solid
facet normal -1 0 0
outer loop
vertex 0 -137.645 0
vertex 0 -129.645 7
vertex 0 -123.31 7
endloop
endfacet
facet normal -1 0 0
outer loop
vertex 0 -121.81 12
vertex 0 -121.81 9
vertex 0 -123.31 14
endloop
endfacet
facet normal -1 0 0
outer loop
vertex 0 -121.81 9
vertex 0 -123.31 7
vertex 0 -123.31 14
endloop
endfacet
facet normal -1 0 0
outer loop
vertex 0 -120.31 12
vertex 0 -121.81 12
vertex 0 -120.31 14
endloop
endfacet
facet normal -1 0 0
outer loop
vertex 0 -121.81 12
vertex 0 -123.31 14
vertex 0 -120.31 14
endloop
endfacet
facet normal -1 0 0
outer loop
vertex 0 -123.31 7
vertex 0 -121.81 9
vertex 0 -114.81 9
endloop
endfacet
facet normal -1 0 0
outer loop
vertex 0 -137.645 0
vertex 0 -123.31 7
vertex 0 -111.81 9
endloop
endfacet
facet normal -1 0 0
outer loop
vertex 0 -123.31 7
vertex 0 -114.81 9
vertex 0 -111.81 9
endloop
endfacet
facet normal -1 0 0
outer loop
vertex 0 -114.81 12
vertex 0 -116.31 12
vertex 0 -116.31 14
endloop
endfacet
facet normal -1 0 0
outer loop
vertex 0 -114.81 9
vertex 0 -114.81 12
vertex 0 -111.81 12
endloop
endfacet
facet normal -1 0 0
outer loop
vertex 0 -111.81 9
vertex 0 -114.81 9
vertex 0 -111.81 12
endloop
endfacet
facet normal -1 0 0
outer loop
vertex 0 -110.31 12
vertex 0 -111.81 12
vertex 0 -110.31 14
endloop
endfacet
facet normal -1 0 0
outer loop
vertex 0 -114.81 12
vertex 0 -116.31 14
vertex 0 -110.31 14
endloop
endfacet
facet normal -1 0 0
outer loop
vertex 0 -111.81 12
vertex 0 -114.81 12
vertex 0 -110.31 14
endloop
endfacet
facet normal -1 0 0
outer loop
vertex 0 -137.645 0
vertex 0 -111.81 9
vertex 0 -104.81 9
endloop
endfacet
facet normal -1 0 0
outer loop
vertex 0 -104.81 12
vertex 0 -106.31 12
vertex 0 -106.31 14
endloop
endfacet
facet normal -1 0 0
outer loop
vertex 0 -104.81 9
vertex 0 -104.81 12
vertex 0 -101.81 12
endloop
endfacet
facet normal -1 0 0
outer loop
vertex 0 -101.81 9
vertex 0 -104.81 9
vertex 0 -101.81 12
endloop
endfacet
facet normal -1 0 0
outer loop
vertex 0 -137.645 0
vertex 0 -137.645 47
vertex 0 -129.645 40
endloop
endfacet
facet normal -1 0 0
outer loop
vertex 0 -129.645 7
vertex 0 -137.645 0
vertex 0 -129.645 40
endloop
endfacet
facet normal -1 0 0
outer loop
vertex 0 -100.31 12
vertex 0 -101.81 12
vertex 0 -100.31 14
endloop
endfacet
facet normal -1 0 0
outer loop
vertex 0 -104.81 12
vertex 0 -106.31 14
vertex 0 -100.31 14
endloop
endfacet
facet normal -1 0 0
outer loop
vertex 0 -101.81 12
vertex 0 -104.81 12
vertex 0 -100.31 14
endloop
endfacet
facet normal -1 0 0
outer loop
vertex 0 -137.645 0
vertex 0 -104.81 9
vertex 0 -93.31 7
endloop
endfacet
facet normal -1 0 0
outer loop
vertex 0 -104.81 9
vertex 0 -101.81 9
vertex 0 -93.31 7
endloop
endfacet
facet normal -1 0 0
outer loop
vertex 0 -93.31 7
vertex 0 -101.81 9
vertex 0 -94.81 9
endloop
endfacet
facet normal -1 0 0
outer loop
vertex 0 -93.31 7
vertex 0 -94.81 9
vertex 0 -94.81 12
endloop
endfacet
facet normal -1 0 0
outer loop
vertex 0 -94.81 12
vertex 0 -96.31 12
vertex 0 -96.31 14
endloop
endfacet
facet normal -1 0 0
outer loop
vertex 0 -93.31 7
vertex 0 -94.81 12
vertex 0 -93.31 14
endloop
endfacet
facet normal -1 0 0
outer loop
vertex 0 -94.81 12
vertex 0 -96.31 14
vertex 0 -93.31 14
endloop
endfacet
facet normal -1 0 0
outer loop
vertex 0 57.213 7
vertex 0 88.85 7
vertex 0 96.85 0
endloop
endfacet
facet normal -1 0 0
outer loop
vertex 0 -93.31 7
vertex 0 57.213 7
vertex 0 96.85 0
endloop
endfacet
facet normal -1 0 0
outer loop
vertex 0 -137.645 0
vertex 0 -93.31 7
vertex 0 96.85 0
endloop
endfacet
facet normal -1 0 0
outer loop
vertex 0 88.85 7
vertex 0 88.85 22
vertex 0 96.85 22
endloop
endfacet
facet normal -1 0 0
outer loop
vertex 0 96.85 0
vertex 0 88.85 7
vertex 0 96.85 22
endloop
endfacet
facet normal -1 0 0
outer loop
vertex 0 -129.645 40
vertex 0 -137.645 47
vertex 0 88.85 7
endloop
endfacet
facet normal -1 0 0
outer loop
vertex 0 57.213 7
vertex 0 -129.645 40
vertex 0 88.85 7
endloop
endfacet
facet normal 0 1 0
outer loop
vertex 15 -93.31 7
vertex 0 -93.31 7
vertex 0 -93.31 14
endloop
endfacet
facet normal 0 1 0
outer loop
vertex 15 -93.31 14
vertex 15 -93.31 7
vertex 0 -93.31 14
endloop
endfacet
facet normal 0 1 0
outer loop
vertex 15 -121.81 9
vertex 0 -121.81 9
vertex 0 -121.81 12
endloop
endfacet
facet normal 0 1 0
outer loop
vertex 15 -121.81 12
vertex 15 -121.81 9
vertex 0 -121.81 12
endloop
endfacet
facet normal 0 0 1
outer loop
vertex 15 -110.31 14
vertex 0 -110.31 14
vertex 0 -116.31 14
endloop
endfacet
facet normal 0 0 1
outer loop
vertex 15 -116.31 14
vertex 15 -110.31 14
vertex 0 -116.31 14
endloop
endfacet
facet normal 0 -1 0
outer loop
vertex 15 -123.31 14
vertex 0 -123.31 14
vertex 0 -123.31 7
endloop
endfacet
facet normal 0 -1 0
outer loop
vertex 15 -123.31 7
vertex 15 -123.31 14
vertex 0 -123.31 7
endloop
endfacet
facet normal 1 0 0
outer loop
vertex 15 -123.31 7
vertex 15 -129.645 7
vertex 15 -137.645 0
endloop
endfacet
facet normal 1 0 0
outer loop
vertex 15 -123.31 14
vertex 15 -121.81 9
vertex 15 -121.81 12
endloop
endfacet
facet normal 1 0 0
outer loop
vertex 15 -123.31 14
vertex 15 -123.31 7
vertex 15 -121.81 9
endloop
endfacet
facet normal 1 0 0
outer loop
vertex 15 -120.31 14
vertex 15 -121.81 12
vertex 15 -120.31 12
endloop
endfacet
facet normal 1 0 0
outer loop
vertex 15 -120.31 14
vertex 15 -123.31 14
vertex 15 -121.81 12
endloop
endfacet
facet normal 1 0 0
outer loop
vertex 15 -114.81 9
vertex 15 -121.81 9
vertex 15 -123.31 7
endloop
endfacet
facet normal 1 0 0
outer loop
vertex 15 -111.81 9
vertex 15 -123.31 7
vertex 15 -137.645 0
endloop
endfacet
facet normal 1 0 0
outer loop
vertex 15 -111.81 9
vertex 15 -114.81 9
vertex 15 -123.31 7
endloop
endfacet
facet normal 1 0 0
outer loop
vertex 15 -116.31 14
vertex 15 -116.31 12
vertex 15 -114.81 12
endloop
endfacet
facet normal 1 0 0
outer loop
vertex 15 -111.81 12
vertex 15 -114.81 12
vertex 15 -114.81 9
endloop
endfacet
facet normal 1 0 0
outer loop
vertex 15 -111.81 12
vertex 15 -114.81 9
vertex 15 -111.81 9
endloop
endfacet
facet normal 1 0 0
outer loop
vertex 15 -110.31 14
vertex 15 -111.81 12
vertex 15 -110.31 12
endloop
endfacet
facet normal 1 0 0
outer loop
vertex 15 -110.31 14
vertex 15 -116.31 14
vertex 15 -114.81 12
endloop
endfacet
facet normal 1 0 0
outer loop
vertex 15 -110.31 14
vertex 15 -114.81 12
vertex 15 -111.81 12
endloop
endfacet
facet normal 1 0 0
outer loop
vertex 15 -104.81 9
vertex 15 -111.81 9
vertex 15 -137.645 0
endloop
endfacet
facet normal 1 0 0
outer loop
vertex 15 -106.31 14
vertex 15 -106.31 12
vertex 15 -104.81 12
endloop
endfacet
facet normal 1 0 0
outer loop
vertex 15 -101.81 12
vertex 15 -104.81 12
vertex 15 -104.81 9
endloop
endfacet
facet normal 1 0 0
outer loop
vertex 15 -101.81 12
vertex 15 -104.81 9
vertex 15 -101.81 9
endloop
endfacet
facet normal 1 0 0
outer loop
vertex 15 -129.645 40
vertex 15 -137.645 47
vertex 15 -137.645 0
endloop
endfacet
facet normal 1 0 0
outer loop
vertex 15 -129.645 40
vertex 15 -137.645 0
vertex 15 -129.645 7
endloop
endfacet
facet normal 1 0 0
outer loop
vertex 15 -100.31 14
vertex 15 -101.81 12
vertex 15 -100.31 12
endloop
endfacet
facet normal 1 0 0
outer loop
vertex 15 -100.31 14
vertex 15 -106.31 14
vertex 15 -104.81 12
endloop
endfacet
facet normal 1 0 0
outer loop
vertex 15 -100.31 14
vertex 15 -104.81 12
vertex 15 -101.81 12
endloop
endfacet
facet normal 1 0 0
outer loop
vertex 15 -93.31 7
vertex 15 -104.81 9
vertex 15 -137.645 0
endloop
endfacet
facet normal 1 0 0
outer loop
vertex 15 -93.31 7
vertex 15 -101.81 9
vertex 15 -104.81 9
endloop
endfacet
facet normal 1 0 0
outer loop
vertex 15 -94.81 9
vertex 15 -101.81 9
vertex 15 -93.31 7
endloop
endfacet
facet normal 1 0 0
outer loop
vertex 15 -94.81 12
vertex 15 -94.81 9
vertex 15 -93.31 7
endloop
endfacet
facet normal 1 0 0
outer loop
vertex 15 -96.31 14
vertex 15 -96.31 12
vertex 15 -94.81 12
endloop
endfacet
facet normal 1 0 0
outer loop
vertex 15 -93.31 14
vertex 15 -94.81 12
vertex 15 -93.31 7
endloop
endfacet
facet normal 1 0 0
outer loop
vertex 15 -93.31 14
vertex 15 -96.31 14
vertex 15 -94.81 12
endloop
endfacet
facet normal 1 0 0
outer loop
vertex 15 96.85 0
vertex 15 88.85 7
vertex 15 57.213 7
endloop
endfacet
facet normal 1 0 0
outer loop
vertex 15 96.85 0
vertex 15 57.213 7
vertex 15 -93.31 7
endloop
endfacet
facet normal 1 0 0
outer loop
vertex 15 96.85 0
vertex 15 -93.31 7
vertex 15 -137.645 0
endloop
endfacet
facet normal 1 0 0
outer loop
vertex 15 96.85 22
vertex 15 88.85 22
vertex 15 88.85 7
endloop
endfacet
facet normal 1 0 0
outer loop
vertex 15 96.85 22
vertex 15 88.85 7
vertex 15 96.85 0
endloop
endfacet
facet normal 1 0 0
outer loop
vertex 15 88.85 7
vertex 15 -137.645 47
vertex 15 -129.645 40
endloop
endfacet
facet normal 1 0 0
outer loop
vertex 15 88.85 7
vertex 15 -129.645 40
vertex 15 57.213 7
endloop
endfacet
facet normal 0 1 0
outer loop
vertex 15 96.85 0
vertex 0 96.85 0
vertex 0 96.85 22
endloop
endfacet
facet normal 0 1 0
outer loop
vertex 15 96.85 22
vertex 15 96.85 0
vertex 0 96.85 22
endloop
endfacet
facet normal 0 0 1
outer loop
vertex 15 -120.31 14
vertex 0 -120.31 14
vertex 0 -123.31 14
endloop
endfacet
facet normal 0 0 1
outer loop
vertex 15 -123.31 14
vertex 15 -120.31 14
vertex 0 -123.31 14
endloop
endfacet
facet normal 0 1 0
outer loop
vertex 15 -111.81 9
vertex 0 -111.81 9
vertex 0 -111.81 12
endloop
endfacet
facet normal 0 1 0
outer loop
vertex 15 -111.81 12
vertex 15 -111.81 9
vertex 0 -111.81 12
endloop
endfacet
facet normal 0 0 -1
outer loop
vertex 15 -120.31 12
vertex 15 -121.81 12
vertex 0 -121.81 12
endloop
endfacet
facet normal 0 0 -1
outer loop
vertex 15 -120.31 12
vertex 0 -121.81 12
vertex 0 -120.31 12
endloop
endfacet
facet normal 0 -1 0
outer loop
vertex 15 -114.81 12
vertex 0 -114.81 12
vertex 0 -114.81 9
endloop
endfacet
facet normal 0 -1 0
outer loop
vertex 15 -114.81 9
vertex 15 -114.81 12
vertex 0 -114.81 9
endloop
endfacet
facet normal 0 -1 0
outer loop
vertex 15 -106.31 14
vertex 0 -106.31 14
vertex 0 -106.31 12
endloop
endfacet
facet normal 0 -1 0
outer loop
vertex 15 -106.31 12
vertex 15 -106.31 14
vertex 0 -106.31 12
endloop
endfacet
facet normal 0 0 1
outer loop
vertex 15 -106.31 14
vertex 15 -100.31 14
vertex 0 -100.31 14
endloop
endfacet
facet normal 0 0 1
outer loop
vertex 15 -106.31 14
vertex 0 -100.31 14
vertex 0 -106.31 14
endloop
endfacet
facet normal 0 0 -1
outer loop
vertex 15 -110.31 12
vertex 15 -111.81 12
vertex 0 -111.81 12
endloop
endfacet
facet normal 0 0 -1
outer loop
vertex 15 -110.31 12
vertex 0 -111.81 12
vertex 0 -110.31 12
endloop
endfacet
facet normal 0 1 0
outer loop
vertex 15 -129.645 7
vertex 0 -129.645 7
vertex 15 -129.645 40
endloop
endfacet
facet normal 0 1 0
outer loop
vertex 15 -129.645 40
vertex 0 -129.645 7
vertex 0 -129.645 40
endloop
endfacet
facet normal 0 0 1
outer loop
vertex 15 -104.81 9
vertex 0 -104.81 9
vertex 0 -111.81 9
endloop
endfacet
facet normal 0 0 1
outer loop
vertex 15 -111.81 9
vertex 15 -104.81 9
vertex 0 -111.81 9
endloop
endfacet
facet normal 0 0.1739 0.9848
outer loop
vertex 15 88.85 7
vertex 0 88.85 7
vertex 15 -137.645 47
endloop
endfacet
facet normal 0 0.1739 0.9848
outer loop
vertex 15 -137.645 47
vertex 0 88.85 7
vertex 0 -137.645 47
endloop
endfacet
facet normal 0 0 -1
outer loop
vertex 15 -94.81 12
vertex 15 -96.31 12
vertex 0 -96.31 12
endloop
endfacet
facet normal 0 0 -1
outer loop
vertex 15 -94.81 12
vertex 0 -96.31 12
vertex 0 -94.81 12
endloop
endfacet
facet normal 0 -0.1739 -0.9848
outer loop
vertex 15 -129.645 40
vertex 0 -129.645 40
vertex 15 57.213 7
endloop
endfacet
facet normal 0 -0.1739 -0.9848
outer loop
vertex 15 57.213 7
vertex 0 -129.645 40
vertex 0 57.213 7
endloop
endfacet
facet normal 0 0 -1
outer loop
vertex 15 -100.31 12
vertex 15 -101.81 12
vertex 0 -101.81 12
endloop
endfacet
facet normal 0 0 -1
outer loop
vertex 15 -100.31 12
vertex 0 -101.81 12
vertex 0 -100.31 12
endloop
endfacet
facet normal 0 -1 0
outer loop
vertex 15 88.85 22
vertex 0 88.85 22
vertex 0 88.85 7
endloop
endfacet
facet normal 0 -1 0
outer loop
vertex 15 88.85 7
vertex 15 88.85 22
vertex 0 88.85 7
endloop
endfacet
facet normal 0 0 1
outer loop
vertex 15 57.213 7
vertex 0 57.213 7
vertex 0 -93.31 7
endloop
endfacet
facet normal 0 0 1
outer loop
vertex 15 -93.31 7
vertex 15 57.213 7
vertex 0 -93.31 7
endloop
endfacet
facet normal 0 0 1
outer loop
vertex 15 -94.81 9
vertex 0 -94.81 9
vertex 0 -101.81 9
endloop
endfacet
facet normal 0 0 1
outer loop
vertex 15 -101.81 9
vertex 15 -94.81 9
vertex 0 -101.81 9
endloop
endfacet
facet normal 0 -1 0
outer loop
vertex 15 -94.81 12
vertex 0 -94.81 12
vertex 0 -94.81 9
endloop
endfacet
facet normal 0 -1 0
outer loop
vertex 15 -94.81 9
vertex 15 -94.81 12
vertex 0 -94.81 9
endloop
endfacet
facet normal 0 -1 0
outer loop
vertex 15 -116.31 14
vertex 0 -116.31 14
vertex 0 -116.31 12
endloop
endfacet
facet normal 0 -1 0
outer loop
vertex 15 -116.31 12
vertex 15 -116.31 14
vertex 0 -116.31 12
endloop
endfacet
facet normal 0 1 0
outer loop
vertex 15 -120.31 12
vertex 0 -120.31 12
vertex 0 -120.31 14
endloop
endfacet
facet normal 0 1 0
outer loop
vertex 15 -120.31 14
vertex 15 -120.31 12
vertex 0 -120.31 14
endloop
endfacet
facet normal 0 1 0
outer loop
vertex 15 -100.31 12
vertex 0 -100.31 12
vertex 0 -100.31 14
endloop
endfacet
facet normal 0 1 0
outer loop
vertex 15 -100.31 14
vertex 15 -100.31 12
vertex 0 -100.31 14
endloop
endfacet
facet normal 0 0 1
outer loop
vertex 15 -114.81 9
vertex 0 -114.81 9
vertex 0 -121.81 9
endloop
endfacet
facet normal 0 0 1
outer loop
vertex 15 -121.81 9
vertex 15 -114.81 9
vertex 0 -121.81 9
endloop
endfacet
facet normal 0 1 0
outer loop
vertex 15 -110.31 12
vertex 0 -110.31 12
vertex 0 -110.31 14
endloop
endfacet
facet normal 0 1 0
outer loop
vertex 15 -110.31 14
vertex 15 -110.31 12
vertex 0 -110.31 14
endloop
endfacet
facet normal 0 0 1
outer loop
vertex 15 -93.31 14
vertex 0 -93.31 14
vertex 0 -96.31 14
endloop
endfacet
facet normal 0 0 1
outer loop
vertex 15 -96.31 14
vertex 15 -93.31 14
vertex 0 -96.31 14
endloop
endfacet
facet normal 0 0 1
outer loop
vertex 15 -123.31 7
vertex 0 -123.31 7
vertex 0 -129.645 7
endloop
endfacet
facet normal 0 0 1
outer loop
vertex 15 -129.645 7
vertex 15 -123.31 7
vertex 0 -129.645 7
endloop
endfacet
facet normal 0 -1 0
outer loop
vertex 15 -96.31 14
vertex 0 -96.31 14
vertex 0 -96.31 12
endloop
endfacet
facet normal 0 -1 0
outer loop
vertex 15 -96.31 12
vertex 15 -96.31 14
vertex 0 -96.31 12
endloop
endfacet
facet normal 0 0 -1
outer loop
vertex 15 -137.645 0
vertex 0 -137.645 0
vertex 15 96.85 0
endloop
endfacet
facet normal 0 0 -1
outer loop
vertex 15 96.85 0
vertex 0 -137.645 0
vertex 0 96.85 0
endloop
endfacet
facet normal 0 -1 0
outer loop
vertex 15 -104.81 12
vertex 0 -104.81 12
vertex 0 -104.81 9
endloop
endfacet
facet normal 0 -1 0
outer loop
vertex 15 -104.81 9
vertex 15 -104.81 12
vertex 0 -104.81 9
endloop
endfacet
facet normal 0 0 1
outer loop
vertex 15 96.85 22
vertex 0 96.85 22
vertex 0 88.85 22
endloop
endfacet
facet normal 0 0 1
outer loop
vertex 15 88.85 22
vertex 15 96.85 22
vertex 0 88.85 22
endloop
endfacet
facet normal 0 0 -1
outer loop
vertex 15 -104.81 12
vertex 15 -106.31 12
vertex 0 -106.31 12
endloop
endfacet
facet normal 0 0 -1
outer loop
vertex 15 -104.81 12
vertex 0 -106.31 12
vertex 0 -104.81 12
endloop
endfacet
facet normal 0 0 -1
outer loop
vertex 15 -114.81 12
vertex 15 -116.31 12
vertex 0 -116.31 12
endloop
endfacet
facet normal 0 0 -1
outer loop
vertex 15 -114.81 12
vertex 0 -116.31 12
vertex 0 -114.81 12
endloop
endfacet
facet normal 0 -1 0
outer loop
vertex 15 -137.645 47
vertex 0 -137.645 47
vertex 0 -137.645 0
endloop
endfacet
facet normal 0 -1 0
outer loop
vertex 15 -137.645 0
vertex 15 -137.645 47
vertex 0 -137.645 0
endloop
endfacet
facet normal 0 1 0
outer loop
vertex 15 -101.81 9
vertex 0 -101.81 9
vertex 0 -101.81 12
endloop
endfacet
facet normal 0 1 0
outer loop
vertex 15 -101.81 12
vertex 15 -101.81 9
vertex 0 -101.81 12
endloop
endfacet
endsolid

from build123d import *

# Parameters (mm, degrees)
F1_DEPTH = 15


# Not quite as in the source:
# - ends of sketch curves that miss each other by under 0.0002 mm in the source are joined


with BuildPart() as f1:
    # F0 (on Right) → F1 (new body)
    with BuildSketch(Plane.YZ):
        Polygon((57.2133171244, 7), (96.8499479096, 0), (96.8499479096, 22), (88.8499479096, 22), (88.8499479096, 7), align=None)
        Polygon((-129.6450851485, 0), (96.8499479096, 0), (57.2133171244, 7), (-93.3098772168, 7), (-103.3098761737, 7), (-113.3098740876, 7), (-123.3098730445, 7), (-129.6450851485, 7), align=None)
        Polygon((-129.6450851485, 40), (57.2133171244, 7), (88.8499479096, 7), (-137.6450851485, 47), (-137.6450851485, 0), (-129.6450851485, 0), (-129.6450851485, 7), align=None)
        Polygon((-123.3098730445, 14), (-123.3098730445, 7), (-113.3098740876, 7), (-113.3098730445, 14), (-116.3098730445, 14), (-116.3098730445, 12), (-114.8098730445, 12), (-114.8098730445, 9), (-121.8098730445, 9), (-121.8098730445, 12), (-120.3098730445, 12), (-120.3098730445, 14), align=None)
        Polygon((-113.3098740876, 7), (-103.3098761737, 7), (-103.3098751307, 14), (-106.3098751307, 14), (-106.3098751307, 12), (-104.8098751307, 12), (-104.8098751307, 9), (-111.8098751307, 9), (-111.8098751307, 12), (-110.3098751307, 12), (-110.3098751307, 14), (-113.3098751307, 14), align=None)
        Polygon((-103.3098761737, 7), (-93.3098772168, 7), (-93.3098772168, 14), (-96.3098772168, 14), (-96.3098772168, 12), (-94.8098772168, 12), (-94.8098772168, 9), (-101.8098772168, 9), (-101.8098772168, 12), (-100.3098772168, 12), (-100.3098772168, 14), (-103.3098772168, 14), align=None)
    extrude(amount=F1_DEPTH)


solid = f1.part
